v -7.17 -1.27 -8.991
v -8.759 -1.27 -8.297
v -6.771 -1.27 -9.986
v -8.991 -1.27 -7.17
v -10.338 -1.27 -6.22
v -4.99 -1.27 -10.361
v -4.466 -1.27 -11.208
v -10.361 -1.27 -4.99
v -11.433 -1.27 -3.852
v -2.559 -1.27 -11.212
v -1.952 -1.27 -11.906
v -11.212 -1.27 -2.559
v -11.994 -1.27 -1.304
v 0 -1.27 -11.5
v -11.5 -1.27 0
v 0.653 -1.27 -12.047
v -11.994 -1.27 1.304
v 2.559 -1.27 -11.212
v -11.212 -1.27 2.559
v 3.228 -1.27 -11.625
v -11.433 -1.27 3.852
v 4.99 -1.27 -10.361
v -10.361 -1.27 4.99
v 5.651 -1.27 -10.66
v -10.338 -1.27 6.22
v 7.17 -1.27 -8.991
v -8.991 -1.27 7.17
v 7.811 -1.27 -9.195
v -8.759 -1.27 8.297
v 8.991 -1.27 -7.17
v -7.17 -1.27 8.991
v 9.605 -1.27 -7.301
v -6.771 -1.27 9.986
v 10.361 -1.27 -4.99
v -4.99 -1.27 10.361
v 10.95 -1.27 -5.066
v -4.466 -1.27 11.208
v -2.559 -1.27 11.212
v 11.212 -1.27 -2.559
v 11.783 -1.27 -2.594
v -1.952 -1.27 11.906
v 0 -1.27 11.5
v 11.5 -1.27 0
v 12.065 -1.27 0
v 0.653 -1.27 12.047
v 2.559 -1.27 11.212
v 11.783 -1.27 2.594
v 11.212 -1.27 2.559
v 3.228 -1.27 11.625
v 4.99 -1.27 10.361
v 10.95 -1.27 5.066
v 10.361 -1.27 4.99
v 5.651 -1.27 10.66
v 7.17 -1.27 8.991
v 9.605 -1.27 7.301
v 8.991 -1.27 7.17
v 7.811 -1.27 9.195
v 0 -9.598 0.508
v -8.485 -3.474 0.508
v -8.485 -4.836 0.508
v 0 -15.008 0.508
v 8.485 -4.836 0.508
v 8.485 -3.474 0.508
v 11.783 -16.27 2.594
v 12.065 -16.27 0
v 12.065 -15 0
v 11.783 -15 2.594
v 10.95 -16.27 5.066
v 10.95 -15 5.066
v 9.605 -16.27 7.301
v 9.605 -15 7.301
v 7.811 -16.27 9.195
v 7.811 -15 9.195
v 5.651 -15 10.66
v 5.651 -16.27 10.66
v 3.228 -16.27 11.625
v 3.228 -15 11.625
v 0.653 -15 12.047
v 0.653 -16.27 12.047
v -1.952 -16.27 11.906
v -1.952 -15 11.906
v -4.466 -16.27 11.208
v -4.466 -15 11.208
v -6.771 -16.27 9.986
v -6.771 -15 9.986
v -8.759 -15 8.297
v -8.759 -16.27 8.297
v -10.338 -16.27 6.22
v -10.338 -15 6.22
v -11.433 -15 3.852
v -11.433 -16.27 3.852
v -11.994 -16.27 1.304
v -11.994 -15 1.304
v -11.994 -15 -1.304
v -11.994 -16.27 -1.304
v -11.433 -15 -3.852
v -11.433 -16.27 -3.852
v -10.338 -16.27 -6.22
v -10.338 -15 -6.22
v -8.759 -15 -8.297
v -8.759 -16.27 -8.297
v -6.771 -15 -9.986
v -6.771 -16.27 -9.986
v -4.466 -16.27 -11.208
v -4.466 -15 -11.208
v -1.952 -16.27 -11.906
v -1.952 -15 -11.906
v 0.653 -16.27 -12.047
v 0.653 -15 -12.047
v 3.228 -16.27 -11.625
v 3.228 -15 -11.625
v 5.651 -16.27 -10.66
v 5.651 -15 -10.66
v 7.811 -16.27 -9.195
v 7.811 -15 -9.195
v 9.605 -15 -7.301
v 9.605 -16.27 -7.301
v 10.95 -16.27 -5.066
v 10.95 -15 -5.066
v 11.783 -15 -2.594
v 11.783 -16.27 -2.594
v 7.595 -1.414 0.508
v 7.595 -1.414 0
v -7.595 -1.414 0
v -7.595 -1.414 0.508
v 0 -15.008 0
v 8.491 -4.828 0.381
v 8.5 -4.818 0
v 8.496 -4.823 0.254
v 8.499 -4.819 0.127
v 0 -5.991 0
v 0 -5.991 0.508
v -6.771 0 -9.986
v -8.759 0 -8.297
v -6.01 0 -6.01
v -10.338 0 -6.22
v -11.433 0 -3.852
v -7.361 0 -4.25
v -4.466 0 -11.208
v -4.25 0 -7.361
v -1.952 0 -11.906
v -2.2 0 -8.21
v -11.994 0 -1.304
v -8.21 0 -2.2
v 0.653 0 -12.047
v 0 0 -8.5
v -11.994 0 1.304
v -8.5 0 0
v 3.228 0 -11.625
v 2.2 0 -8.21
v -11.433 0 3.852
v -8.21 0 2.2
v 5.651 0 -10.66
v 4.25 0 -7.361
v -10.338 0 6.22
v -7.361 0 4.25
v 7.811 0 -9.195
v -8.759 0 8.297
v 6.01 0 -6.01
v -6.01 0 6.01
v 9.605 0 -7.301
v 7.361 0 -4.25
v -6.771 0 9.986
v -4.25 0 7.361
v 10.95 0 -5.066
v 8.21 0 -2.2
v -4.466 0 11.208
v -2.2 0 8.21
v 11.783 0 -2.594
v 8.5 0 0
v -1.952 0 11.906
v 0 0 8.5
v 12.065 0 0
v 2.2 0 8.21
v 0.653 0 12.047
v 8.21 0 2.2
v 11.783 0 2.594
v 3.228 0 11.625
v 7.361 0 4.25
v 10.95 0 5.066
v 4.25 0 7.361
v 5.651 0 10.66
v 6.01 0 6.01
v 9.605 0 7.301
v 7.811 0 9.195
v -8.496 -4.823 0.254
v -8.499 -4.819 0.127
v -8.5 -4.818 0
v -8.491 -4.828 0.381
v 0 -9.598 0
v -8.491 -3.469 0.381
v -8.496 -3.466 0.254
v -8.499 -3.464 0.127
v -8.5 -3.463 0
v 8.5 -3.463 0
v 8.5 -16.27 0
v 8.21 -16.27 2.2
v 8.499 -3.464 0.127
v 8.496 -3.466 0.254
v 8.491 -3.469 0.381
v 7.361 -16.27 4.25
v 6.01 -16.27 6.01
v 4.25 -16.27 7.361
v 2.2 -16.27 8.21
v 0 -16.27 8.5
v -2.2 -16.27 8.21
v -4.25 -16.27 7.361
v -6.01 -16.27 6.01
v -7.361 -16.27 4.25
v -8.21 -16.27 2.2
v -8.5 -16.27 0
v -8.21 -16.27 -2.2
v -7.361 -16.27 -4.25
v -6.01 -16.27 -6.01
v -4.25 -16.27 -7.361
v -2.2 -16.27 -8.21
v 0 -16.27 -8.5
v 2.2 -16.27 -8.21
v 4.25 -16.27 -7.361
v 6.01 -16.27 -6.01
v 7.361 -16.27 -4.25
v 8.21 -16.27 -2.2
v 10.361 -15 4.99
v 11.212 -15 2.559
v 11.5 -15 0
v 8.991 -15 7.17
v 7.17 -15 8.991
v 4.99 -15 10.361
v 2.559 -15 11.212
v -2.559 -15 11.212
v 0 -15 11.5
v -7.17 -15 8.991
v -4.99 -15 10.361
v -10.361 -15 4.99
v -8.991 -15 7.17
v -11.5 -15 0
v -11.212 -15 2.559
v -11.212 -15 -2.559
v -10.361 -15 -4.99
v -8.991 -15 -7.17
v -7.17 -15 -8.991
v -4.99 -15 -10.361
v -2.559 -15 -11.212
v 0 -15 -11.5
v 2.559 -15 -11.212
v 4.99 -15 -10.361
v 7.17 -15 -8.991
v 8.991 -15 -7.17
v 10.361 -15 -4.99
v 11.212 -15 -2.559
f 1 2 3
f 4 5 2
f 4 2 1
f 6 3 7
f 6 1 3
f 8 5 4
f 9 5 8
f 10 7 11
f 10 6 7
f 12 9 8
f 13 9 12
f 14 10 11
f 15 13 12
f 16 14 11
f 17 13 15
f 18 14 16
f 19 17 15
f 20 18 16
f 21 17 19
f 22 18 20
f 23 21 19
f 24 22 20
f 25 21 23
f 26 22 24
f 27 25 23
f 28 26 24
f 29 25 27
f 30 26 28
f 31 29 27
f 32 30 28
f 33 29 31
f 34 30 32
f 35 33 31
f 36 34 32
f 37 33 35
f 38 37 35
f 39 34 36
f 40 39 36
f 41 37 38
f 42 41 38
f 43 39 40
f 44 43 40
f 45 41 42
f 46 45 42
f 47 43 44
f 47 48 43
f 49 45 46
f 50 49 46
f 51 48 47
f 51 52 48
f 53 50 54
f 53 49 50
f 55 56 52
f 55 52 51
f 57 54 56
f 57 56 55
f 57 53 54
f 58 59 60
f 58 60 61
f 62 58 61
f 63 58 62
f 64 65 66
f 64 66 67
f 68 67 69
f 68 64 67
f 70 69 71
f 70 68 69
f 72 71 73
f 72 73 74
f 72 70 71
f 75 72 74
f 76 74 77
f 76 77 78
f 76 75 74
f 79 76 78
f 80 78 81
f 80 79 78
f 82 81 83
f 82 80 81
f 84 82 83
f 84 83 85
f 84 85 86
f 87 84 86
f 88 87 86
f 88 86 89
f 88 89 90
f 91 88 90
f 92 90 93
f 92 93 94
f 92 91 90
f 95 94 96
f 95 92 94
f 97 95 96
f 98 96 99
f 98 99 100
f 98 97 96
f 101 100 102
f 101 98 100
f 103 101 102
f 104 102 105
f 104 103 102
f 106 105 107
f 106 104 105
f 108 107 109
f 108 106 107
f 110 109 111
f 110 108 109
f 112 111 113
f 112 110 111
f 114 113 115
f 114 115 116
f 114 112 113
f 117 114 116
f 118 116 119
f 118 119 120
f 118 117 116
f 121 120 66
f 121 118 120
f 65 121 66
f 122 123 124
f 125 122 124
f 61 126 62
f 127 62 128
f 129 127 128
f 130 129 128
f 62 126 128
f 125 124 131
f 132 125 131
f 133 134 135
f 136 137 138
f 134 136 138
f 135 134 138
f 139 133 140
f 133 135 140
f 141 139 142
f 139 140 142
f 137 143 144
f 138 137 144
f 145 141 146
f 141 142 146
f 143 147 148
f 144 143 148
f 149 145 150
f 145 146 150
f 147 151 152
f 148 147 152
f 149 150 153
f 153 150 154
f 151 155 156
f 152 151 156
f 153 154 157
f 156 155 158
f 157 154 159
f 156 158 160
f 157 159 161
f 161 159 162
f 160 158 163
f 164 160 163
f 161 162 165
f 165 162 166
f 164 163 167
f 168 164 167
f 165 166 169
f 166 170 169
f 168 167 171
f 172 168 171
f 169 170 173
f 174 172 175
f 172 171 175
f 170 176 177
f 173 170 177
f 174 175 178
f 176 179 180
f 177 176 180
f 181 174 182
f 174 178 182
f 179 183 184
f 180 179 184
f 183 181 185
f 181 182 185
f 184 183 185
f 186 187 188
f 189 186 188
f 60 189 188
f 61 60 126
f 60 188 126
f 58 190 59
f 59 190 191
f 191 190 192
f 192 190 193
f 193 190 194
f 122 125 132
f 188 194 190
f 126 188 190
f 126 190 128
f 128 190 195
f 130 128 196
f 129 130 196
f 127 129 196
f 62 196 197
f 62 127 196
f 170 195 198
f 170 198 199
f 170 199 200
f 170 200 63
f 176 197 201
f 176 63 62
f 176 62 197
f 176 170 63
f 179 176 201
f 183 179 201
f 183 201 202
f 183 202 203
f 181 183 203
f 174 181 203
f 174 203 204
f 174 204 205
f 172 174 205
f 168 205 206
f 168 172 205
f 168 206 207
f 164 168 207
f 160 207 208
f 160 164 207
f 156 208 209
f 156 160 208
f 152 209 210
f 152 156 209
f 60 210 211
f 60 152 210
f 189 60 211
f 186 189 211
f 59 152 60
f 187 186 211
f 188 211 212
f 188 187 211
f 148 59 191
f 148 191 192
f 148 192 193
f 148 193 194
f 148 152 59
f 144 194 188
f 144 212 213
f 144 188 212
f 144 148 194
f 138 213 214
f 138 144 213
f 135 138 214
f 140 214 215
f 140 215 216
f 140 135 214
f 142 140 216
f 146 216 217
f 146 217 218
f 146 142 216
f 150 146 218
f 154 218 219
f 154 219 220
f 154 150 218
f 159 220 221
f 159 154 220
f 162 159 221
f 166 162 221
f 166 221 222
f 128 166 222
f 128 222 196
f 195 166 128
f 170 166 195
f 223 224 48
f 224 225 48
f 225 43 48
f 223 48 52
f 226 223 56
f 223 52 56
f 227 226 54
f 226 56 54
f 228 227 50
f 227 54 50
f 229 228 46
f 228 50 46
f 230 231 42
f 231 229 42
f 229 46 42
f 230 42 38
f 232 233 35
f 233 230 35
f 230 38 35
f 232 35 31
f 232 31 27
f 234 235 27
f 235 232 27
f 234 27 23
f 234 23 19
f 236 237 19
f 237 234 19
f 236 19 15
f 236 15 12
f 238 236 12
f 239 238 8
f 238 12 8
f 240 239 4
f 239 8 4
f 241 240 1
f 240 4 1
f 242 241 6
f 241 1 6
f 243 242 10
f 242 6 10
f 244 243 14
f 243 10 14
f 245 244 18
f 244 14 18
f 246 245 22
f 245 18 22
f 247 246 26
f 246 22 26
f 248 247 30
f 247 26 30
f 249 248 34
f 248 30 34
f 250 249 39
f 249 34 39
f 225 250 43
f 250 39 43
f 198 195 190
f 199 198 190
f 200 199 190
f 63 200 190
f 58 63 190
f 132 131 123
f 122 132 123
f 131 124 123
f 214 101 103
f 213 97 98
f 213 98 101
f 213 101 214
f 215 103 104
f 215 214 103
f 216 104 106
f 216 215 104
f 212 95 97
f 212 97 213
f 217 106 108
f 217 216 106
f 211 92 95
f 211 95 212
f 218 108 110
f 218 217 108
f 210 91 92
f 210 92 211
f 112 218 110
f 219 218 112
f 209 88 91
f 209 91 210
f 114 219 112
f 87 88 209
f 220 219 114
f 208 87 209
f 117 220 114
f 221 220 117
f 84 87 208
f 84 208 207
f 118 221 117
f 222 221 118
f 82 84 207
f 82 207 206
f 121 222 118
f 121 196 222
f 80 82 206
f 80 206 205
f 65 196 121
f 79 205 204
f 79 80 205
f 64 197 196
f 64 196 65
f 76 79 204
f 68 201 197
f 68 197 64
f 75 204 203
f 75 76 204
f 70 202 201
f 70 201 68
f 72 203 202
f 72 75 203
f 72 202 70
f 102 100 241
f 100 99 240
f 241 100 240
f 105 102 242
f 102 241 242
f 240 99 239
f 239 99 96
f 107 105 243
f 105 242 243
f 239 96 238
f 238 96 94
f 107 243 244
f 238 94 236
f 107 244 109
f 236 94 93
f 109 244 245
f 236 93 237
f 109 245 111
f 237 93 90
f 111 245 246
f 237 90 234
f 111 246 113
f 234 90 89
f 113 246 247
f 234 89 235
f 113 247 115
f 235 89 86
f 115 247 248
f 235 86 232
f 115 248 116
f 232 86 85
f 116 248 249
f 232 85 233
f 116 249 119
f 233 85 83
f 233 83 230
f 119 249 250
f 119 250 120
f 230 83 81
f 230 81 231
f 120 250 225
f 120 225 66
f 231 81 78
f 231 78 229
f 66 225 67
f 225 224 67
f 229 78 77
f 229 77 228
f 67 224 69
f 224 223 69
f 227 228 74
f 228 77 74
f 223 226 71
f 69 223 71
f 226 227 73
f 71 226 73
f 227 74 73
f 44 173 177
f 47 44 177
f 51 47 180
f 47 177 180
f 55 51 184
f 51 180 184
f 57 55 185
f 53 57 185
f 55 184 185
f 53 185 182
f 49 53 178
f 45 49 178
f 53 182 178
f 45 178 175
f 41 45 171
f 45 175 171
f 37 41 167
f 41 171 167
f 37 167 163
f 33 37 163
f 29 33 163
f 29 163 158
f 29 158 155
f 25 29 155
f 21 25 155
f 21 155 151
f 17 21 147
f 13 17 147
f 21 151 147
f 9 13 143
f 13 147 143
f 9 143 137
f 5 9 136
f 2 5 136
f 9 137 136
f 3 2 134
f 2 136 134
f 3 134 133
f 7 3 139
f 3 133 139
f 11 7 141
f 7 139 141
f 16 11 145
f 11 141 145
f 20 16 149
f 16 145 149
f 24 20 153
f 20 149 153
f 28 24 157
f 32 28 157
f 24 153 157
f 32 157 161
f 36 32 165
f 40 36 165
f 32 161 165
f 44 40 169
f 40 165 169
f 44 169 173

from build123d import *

# Parameters (mm, degrees)
F0_R        = 11.5
F0_R_2      = 8.5
F1_DEPTH    = 15
F1_FACE_R   = 11.5
F1_FACE_R_2 = 8.5
F2_R        = 12.065
F2_R_2      = 8.568033
F3_DEPTH    = 1.27
F4_R        = 12.065
F4_R_2      = 8.746033
F5_DEPTH    = 1.27
F7_DEPTH    = 0.508


with BuildPart() as f1:
    # F0 (on Front) → F1 (new body)
    with BuildSketch(Plane.XZ):
        Circle(F0_R)
        Circle(F0_R_2, mode=Mode.SUBTRACT)
    extrude(amount=F1_DEPTH)

    # F1_face (on face) + F2 (on Front) → F3 (join)
    with BuildSketch(Plane.XZ.offset(15)):
        Circle(F1_FACE_R)
        Circle(F1_FACE_R_2, mode=Mode.SUBTRACT)
    with BuildSketch(Plane.XZ):
        Circle(F2_R)
        Circle(F2_R_2, mode=Mode.SUBTRACT)
    extrude(amount=F3_DEPTH)

    # F4 (on face) → F5 (join)
    with BuildSketch(Plane.XZ.offset(16.27)):
        Circle(F4_R)
        Circle(F4_R_2, mode=Mode.SUBTRACT)
    extrude(amount=-F5_DEPTH)

    # F6 (on Top) → F7 (join)
    with BuildSketch(Plane.XY):
        Polygon((-11.340066, -1.413542), (0, -15.007579), (11.340066, -1.413542), (0, -9.597708), align=None)
        Polygon((7.59477, -1.413542), (0, -1.413542), (-7.59477, -1.413542), (0, -5.991126), align=None)
    extrude(amount=F7_DEPTH)


solid = f1.part
